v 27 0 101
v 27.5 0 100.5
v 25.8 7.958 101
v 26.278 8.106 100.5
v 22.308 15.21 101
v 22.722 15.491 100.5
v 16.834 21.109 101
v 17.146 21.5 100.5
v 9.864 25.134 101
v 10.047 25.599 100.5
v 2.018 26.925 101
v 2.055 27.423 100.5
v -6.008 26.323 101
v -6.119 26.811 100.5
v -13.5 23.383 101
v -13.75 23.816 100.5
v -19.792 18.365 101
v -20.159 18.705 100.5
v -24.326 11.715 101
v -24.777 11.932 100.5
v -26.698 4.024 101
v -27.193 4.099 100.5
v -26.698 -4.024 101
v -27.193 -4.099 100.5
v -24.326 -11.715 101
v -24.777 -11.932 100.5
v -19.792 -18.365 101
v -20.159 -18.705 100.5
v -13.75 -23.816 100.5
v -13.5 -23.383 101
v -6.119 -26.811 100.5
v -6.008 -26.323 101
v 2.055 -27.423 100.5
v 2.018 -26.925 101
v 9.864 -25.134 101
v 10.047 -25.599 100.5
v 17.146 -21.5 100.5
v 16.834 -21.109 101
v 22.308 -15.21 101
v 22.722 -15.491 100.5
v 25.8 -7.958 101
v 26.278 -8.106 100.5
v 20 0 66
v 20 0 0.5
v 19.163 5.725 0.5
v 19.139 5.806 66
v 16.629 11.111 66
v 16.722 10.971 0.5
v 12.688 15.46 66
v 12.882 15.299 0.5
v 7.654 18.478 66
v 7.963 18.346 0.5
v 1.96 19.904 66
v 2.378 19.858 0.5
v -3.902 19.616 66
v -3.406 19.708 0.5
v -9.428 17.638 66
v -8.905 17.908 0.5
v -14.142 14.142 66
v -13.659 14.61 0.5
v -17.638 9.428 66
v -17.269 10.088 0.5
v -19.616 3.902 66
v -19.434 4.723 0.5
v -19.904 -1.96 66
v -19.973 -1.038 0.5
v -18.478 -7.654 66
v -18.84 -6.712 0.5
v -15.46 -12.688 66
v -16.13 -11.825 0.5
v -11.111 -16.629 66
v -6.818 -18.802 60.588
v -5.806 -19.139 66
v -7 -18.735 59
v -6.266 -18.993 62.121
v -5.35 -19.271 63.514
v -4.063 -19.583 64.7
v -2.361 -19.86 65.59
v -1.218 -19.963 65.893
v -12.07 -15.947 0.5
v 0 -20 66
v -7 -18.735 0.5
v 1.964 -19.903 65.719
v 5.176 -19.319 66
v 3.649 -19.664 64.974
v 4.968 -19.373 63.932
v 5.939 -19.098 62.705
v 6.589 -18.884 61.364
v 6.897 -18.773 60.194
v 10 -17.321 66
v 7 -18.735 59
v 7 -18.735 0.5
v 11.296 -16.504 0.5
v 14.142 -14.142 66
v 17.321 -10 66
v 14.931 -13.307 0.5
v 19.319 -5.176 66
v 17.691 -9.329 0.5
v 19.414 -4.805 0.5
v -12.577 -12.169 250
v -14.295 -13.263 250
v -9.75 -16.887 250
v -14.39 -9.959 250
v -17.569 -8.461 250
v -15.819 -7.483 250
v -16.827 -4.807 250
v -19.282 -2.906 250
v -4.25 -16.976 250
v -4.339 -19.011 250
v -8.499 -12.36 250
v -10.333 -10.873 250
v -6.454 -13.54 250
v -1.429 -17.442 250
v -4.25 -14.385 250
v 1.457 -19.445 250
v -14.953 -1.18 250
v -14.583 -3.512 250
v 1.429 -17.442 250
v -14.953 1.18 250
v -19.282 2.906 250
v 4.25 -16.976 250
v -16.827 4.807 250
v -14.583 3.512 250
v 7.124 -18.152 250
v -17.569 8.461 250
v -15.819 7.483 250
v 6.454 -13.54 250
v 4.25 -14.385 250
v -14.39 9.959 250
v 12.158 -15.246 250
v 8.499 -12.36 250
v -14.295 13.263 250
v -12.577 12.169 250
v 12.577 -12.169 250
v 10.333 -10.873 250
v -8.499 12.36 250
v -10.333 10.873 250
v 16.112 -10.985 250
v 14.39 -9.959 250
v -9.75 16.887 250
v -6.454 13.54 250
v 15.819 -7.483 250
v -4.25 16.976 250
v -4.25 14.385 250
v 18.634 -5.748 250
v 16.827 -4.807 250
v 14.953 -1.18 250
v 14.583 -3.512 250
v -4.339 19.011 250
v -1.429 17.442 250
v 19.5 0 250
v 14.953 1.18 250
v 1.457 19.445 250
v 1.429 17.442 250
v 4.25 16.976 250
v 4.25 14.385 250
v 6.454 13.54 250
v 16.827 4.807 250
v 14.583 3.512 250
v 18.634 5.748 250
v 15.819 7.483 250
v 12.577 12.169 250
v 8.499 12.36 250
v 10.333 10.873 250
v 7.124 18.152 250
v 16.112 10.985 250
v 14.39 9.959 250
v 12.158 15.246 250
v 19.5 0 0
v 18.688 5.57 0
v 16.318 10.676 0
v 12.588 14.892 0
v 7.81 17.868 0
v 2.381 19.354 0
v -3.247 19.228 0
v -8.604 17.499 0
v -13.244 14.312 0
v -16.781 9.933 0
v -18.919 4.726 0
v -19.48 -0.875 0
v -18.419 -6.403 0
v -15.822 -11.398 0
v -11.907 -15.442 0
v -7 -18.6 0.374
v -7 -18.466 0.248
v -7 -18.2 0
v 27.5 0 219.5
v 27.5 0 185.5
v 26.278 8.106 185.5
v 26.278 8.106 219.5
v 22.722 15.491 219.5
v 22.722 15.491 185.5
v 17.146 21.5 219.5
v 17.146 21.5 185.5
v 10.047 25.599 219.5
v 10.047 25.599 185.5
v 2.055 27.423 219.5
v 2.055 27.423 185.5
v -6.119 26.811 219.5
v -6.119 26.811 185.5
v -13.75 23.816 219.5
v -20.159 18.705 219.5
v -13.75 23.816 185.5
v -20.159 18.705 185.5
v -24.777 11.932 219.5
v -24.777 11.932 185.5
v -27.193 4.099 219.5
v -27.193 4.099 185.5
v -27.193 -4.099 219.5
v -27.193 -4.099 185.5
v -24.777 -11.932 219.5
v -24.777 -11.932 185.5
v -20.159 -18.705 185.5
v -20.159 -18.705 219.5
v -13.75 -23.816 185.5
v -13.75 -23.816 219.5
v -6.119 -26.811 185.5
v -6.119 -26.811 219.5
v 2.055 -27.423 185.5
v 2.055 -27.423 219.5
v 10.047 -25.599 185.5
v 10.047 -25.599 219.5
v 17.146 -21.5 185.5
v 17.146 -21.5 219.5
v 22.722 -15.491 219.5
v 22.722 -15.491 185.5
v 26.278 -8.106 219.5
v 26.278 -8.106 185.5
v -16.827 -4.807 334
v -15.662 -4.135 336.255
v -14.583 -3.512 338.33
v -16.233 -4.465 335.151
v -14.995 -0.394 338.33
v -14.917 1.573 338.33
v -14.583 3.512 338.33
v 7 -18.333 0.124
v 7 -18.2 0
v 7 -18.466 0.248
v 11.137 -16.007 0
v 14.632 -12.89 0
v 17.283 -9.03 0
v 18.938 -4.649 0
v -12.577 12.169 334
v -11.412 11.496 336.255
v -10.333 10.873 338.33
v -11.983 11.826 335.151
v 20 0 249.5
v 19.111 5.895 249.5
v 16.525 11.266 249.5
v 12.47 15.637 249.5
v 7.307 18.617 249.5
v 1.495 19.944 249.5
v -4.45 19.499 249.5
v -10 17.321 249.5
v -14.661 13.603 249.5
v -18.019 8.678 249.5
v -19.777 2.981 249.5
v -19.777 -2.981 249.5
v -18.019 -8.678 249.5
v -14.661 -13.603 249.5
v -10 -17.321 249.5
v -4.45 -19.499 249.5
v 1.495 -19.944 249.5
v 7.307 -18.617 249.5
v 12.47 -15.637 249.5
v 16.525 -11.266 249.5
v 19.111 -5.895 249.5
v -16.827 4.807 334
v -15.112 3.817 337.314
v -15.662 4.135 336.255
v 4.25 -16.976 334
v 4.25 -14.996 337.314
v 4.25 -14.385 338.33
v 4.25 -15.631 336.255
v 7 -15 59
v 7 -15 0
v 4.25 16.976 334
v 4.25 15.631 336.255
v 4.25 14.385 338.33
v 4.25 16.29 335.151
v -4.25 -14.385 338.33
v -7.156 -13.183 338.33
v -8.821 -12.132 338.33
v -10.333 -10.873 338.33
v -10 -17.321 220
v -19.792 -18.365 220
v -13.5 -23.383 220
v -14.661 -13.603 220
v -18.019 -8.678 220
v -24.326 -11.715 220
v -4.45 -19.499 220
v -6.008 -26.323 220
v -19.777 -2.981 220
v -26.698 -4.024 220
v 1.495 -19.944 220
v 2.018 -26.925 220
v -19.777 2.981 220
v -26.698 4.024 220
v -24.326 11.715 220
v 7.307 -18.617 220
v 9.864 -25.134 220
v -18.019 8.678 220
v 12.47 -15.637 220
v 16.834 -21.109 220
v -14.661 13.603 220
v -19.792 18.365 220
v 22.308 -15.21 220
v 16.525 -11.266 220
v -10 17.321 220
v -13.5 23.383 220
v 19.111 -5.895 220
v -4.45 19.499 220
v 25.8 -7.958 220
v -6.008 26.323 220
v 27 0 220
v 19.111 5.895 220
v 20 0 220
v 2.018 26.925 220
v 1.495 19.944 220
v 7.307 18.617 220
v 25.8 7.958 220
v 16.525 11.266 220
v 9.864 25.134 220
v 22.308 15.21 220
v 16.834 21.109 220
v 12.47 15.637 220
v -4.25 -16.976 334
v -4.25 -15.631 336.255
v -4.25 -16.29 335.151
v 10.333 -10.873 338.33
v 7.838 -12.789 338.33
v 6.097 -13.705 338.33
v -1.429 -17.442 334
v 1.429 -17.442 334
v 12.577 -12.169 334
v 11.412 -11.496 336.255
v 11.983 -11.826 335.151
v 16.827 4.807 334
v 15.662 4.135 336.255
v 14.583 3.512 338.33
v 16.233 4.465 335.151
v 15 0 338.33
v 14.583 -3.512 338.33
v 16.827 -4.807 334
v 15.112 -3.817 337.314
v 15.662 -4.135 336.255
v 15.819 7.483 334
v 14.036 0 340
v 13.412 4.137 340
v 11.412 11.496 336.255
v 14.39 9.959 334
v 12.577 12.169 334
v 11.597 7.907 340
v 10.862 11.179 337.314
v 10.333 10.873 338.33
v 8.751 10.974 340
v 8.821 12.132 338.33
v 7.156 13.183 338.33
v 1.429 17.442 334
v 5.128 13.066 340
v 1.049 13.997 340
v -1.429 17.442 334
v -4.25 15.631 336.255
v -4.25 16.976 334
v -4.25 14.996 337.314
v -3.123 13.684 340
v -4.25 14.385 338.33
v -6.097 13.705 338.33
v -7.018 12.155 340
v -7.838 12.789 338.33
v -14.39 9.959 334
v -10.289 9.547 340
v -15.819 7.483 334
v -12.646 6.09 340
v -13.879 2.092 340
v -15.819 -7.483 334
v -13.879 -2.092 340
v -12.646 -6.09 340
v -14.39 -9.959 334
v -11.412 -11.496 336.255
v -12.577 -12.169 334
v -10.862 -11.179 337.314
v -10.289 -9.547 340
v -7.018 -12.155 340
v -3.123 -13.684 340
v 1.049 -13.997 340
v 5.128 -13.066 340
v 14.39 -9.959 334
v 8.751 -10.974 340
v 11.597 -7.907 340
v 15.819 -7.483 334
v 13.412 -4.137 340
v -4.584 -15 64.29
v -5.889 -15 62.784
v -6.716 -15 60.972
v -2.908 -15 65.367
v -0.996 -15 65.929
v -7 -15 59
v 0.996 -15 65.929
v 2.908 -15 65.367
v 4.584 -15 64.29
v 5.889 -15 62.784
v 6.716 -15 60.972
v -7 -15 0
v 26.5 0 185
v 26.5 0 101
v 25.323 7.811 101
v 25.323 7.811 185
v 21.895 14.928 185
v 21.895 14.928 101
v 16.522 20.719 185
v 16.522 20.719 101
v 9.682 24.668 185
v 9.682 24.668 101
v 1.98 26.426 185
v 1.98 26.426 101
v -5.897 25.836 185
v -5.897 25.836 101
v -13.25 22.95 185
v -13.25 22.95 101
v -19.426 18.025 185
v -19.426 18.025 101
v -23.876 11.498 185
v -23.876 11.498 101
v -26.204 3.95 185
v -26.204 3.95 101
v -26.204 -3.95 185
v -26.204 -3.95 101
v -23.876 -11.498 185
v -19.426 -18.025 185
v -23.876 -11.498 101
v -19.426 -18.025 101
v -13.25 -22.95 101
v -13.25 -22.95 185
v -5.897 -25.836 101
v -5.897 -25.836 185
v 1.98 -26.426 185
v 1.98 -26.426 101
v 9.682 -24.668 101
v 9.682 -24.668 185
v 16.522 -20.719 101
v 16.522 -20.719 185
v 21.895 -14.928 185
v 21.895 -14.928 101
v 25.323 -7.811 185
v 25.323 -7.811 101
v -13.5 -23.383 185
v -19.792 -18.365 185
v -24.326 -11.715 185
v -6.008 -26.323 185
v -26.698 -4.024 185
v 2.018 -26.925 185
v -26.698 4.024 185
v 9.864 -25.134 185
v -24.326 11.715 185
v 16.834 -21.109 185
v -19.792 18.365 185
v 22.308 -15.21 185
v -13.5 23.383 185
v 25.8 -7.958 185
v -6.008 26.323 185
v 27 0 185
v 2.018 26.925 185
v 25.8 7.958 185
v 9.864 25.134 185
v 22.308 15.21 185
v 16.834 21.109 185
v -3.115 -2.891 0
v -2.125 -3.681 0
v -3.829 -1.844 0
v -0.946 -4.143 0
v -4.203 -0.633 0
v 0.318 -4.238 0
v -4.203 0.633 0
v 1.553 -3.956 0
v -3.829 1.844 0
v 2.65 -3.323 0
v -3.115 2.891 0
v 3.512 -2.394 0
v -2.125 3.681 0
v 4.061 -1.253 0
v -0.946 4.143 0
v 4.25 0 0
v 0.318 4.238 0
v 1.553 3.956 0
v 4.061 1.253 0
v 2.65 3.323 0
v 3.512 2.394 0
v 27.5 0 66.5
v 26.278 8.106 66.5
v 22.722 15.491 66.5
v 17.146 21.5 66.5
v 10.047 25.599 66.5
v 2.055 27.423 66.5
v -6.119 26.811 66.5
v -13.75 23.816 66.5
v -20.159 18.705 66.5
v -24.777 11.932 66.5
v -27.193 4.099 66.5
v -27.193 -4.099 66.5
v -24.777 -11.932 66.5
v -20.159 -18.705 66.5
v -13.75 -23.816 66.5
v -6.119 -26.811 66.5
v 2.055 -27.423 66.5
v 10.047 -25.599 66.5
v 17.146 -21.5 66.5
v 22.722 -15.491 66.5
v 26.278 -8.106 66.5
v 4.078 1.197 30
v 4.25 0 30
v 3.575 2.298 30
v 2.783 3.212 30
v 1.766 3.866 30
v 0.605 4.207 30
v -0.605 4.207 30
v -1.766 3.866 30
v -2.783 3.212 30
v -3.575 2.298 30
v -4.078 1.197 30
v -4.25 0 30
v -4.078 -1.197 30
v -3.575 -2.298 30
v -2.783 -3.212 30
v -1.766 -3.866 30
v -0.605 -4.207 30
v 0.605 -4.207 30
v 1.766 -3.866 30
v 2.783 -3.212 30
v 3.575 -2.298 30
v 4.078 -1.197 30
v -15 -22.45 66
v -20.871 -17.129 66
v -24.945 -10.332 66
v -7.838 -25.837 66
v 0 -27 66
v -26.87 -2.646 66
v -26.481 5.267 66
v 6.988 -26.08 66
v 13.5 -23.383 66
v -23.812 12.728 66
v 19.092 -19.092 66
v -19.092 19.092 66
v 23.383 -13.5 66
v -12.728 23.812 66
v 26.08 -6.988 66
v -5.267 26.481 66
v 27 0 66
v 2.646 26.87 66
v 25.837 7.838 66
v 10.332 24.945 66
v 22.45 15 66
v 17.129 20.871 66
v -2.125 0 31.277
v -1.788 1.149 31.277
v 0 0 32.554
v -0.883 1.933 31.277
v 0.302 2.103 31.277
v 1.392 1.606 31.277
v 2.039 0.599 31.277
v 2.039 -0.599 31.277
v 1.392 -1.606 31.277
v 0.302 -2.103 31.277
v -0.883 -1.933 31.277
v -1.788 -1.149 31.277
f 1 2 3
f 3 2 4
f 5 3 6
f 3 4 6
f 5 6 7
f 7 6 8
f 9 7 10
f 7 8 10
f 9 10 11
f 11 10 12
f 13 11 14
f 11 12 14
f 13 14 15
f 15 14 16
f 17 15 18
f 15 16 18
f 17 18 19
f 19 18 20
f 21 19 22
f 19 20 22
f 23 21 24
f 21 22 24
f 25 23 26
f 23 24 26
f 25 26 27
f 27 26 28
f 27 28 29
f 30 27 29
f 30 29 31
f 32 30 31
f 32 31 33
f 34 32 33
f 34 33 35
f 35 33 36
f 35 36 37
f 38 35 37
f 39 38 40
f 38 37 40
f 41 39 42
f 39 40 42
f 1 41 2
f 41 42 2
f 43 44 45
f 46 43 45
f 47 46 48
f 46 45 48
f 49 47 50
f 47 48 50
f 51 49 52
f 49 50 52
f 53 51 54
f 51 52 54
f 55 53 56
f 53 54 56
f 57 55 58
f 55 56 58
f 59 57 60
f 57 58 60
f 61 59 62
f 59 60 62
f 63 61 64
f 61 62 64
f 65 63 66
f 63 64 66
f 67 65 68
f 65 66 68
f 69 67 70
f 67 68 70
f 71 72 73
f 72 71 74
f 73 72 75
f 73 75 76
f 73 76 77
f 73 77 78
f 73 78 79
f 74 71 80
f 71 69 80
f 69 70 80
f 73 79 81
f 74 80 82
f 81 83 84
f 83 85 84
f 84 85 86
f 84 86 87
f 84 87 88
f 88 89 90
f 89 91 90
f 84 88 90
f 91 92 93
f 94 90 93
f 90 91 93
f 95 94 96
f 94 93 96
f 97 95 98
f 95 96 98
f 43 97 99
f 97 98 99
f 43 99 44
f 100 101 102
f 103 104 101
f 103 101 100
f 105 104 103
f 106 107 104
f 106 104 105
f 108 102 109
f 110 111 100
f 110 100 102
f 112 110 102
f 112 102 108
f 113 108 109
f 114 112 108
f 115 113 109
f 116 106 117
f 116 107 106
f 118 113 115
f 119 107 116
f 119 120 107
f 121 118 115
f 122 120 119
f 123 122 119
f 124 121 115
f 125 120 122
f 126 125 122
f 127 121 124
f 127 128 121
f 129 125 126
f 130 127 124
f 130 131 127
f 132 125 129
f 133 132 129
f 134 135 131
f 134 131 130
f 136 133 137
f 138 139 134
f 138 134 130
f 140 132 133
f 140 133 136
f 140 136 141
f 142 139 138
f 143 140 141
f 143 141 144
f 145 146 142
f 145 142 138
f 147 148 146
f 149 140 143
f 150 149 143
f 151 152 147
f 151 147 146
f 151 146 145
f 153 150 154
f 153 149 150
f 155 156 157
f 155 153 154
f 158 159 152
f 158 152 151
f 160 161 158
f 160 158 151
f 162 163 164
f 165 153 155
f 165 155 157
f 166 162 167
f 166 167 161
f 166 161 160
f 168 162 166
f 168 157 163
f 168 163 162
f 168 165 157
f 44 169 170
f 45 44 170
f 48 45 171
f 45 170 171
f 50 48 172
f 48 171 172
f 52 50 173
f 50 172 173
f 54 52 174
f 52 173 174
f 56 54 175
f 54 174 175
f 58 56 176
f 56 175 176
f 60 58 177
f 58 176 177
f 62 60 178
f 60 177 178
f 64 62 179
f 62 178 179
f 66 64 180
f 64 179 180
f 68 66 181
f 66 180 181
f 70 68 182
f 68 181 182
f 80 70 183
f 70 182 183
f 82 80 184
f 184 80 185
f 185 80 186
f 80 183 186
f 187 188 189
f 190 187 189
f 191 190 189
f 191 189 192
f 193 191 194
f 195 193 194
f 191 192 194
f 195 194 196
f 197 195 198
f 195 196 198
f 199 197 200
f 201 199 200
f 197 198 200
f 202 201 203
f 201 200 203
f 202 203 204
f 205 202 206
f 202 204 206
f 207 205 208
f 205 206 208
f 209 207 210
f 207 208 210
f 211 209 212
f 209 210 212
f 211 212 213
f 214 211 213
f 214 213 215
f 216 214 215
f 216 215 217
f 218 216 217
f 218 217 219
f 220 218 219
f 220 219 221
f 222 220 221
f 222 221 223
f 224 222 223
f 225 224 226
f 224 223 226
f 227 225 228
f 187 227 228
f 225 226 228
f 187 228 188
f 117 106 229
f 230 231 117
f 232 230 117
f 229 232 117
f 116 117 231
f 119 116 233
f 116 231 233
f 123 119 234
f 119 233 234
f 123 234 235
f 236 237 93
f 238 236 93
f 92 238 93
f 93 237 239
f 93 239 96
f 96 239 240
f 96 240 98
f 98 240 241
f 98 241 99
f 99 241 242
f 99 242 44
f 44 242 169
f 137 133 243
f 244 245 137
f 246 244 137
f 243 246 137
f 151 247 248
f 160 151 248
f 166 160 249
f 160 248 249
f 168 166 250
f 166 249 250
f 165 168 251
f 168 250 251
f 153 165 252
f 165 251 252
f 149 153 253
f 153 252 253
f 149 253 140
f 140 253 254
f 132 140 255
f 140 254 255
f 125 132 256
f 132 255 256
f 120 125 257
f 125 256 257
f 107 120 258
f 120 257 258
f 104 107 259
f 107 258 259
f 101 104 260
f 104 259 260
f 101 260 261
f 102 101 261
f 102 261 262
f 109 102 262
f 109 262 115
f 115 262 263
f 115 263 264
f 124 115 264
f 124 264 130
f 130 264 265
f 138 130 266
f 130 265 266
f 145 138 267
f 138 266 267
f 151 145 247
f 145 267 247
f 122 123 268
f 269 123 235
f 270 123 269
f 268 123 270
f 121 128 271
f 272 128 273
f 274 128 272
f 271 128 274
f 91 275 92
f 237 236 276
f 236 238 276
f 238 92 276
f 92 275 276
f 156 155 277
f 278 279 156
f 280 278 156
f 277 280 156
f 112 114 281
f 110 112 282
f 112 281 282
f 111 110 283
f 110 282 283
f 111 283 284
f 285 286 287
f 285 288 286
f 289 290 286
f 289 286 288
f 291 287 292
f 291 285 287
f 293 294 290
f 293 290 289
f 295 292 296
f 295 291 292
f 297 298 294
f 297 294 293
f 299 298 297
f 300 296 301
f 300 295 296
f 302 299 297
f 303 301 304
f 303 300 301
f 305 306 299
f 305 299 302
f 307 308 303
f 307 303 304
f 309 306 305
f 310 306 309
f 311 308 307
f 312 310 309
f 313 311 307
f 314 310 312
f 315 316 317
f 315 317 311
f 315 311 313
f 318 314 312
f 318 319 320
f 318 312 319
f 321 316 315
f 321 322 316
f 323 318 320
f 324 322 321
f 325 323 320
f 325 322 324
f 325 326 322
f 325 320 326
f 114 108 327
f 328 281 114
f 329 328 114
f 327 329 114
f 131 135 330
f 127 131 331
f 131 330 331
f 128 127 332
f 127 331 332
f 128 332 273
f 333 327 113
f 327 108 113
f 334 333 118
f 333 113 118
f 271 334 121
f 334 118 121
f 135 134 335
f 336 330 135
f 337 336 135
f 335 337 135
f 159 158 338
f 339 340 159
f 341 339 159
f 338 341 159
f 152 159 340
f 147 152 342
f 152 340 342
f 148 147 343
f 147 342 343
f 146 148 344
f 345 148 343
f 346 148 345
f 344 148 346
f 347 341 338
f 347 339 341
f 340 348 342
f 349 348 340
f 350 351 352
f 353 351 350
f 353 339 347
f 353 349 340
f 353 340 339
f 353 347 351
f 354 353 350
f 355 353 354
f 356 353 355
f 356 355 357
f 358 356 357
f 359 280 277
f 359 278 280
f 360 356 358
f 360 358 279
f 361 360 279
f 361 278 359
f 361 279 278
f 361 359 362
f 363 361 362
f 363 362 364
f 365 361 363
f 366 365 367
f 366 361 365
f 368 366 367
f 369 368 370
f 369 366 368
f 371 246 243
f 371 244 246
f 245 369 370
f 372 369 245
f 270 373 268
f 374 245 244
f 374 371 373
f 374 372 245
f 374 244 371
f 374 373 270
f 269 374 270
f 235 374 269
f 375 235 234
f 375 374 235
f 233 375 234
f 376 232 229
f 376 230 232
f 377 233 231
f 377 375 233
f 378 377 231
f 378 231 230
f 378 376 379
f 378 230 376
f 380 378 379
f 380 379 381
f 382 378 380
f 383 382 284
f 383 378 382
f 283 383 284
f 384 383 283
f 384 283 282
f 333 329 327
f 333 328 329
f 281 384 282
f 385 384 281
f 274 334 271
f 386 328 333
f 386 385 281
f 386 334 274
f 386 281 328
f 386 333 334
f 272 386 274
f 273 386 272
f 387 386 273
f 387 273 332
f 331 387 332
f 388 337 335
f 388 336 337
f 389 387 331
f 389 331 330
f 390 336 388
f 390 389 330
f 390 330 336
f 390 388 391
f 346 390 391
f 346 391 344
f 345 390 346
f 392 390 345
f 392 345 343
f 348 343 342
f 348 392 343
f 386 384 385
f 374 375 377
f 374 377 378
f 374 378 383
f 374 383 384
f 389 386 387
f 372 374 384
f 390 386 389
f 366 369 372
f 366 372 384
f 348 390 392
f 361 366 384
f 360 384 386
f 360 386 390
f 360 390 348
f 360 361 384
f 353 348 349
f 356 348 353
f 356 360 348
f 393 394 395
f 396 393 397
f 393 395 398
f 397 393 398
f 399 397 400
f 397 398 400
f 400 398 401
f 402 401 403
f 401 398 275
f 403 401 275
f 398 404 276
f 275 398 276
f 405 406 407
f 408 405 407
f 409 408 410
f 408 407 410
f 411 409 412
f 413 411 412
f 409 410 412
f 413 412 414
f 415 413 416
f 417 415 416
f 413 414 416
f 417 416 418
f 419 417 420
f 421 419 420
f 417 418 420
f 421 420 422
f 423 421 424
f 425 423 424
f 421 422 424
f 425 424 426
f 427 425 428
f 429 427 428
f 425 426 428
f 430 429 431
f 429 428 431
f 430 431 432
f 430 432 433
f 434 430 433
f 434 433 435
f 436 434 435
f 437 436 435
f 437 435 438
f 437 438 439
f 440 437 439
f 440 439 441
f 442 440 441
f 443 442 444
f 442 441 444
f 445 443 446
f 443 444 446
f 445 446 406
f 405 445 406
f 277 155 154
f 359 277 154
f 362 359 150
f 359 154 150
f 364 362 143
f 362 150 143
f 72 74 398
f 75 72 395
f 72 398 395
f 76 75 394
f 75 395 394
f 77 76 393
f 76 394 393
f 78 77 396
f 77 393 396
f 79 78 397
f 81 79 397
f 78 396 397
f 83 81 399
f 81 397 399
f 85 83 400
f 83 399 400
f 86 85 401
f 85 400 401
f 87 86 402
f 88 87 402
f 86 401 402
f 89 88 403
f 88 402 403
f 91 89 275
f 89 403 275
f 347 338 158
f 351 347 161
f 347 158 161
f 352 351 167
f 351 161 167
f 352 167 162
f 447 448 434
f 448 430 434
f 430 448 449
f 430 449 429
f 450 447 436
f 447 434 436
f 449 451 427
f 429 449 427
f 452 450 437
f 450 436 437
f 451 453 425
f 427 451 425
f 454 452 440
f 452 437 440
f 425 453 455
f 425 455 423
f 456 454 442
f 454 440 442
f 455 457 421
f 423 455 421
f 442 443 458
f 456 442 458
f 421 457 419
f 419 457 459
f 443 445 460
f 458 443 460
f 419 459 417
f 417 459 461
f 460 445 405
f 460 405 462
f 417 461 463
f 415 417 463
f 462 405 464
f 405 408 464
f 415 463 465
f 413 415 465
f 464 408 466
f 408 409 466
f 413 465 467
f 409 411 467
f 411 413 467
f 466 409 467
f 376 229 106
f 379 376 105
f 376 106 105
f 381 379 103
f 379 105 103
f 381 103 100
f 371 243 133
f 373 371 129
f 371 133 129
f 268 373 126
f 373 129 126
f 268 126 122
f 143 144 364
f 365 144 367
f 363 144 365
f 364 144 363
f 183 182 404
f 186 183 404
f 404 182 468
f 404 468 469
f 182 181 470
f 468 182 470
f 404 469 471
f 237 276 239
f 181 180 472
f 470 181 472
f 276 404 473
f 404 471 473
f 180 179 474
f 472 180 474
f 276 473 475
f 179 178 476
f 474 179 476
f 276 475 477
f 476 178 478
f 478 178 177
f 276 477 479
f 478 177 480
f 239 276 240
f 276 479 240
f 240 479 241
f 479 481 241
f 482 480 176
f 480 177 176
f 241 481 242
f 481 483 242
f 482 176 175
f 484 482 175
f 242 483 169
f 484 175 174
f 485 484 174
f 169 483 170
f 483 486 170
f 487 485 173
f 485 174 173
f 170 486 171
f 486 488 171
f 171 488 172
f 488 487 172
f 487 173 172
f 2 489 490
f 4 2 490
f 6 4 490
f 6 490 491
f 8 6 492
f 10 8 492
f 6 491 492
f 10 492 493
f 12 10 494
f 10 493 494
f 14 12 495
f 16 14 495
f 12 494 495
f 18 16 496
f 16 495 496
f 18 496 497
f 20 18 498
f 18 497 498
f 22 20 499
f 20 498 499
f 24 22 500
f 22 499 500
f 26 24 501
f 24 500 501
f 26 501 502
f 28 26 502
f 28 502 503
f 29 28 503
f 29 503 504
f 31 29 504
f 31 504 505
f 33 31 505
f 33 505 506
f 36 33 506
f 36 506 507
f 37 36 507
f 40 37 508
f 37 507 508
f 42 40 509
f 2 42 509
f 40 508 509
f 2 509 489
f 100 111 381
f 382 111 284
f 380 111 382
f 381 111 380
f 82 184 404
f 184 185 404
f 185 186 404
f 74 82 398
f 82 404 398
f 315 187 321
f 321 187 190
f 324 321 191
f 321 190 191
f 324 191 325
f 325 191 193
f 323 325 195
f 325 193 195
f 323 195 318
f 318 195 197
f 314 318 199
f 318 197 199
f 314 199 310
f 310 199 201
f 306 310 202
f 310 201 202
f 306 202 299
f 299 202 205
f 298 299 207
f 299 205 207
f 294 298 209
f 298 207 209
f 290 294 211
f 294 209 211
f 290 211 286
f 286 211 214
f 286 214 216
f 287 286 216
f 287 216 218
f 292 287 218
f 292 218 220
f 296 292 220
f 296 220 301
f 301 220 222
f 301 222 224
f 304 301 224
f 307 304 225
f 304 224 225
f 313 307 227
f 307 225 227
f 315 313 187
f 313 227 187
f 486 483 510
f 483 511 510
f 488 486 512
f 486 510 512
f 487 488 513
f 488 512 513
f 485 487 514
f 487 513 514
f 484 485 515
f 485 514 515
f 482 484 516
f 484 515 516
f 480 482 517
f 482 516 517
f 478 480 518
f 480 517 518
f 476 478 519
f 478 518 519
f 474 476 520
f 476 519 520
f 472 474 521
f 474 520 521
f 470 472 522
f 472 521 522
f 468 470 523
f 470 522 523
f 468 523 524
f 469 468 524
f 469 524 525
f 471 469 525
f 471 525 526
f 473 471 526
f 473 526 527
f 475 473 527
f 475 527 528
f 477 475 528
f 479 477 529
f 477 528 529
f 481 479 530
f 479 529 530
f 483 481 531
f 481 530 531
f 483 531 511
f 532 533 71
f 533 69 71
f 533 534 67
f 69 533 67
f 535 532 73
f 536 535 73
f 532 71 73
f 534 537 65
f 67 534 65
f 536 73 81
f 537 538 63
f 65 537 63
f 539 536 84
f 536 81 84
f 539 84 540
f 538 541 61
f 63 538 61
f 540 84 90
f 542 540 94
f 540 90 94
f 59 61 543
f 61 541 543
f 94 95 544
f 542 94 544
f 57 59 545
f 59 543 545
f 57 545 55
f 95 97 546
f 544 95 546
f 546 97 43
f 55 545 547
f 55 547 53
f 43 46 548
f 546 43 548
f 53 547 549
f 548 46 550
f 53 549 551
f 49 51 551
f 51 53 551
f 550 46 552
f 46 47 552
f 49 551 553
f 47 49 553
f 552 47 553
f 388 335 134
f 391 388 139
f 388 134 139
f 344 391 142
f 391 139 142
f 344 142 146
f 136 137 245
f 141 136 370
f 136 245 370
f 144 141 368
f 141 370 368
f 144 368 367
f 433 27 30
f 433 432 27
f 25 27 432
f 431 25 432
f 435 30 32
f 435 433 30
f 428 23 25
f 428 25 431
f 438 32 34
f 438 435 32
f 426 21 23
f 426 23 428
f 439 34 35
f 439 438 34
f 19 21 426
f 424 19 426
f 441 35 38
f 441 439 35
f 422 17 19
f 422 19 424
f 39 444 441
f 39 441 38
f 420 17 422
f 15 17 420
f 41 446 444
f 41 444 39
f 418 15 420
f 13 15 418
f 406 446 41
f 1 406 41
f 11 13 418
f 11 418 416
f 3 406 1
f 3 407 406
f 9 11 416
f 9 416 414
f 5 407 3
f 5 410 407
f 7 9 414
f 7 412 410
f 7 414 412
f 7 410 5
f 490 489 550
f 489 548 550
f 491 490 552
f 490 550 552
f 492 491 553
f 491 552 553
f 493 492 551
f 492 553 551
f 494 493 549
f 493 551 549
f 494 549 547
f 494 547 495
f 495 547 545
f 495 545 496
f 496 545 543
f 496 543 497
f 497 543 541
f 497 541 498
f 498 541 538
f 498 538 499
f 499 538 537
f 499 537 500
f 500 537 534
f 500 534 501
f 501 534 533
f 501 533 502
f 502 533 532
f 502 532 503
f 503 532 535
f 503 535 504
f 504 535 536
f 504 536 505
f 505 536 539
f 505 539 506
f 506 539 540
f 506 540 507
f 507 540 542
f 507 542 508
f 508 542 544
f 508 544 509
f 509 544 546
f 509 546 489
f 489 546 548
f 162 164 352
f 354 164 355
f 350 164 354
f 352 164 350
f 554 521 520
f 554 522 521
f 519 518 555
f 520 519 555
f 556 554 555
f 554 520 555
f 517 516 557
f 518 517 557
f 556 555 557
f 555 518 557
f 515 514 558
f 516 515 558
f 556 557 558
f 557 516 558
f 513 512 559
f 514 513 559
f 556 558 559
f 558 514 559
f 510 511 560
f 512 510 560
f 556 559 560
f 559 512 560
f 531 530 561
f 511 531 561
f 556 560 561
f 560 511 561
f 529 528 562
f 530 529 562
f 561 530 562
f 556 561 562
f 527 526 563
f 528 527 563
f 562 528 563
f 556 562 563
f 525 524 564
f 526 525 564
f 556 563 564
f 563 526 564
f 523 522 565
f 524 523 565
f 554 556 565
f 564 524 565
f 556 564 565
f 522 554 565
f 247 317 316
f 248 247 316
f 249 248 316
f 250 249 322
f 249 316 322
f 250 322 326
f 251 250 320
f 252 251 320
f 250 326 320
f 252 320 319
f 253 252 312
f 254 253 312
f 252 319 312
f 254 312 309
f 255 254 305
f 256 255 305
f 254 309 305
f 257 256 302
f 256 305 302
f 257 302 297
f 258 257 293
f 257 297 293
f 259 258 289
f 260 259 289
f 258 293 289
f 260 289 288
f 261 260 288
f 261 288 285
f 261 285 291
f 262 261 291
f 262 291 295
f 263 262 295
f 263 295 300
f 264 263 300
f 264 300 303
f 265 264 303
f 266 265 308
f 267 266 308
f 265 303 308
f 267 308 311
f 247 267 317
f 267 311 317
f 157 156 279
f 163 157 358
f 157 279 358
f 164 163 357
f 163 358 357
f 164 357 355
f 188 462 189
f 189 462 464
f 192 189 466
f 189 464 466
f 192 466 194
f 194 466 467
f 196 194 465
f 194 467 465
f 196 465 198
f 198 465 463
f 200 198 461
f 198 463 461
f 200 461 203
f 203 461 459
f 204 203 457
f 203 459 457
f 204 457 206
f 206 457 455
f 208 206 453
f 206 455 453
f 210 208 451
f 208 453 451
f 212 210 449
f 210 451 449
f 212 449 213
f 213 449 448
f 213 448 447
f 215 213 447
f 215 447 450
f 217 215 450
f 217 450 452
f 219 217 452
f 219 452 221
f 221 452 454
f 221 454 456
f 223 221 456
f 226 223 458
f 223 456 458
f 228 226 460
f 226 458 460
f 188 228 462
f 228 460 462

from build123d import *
from build123d.topology import SkipClean

# Parameters (mm, degrees)
SKICA1_R                  = 20
P_IDAT_VYSUNUT_M1_DEPTH   = 66
SKICA2_R                  = 27.5
P_IDAT_VYSUNUT_M2_DEPTH   = 35
SKICA3_R                  = 26.5
P_IDAT_VYSUNUT_M3_DEPTH   = 84
SKICA4_R                  = 27.5
P_IDAT_VYSUNUT_M4_DEPTH   = 35
SKICA5_R                  = 20
P_IDAT_VYSUNUT_M5_DEPTH   = 30
SKICA6_R                  = 17.5
P_IDAT_VYSUNUT_M6_DEPTH   = 90
ZKOSEN_3_SIZE             = 6
ZKOSEN_3_SIZE2            = 3.464101615
SKICA9_OUTSIDE_W          = 126.756
SKICA9_OUTSIDE_H          = 126.756
ODEBRAT_VYSUNUT_M16_DEPTH = 90
ZKOSEN_4_SIZE             = 0.5
M10_Z_VIT1_D              = 8.5
M10_Z_VIT1_DEPTH          = 30
M10_Z_VIT1_TIP            = 2.553657631
ODEBRAT_START             = -15
ODEBRAT_VYSUNUT_M17_DEPTH = 13.5


with BuildPart() as part:
    # Skica1 → P_idat vysunut_m1 (new body)
    with BuildSketch(Plane.XY):
        Circle(SKICA1_R)
    extrude(amount=P_IDAT_VYSUNUT_M1_DEPTH)

    # Skica2 → P_idat vysunut_m2 (add)
    with BuildSketch(Plane.XY.offset(66)):
        Circle(SKICA2_R)
    extrude(amount=P_IDAT_VYSUNUT_M2_DEPTH)

    # Skica3 → P_idat vysunut_m3 (add)
    with BuildSketch(Plane.XY.offset(101)):
        Circle(SKICA3_R)
    extrude(amount=P_IDAT_VYSUNUT_M3_DEPTH)

    # Skica4 → P_idat vysunut_m4 (add)
    with BuildSketch(Plane.XY.offset(185)):
        Circle(SKICA4_R)
    extrude(amount=P_IDAT_VYSUNUT_M4_DEPTH)

    # Skica5 → P_idat vysunut_m5 (add)
    with BuildSketch(Plane.XY.offset(220)):
        Circle(SKICA5_R)
    extrude(amount=P_IDAT_VYSUNUT_M5_DEPTH)

    # Skica6 → P_idat vysunut_m6 (add)
    with BuildSketch(Plane.XY.offset(250)):
        Circle(SKICA6_R)
    extrude(amount=P_IDAT_VYSUNUT_M6_DEPTH)

    # Zkosen_3
    zkosen_3_edges = [part.edges().sort_by_distance(p)[0] for p in [
        (-17.5, 0, 340),
    ]]
    zkosen_3_side = [part.faces().sort_by_distance(p)[0] for p in [
        (-17.5, 0, 295),
    ]]
    chamfer(zkosen_3_edges, length=ZKOSEN_3_SIZE, length2=ZKOSEN_3_SIZE2, reference=zkosen_3_side[0])

    # Skica9 outside → Odebrat vysunut_m16 (cut)
    with BuildSketch(Plane.XY.offset(340)):
        Rectangle(SKICA9_OUTSIDE_W, SKICA9_OUTSIDE_H)
        with BuildLine():
            Line((-4.25, 14.385322381), (-4.25, 16.976086121))
            ThreePointArc((-4.25, 16.976086121), (0, 17.5), (4.25, 16.976086121))
            Line((4.25, 16.976086121), (4.25, 14.385322381))
            ThreePointArc((4.25, 14.385322381), (7.5, 12.990381057), (10.333054623, 10.873269156))
            Line((10.333054623, 10.873269156), (12.576721838, 12.168651027))
            ThreePointArc((12.576721838, 12.168651027), (15.155444566, 8.75), (16.826721838, 4.807435095))
            Line((16.826721838, 4.807435095), (14.583054623, 3.512053224))
            ThreePointArc((14.583054623, 3.512053224), (15, 0), (14.583054623, -3.512053224))
            Line((14.583054623, -3.512053224), (16.826721838, -4.807435095))
            ThreePointArc((16.826721838, -4.807435095), (15.155444566, -8.75), (12.576721838, -12.168651027))
            Line((12.576721838, -12.168651027), (10.333054623, -10.873269156))
            ThreePointArc((10.333054623, -10.873269156), (7.5, -12.990381057), (4.25, -14.385322381))
            Line((4.25, -14.385322381), (4.25, -16.976086121))
            ThreePointArc((4.25, -16.976086121), (0, -17.5), (-4.25, -16.976086121))
            Line((-4.25, -16.976086121), (-4.25, -14.385322381))
            ThreePointArc((-4.25, -14.385322381), (-7.5, -12.990381057), (-10.333054623, -10.873269156))
            Line((-10.333054623, -10.873269156), (-12.576721838, -12.168651027))
            ThreePointArc((-12.576721838, -12.168651027), (-15.155444566, -8.75), (-16.826721838, -4.807435095))
            Line((-16.826721838, -4.807435095), (-14.583054623, -3.512053224))
            ThreePointArc((-14.583054623, -3.512053224), (-15, 0), (-14.583054623, 3.512053224))
            Line((-14.583054623, 3.512053224), (-16.826721838, 4.807435095))
            ThreePointArc((-16.826721838, 4.807435095), (-15.155444566, 8.75), (-12.576721838, 12.168651027))
            Line((-12.576721838, 12.168651027), (-10.333054623, 10.873269156))
            ThreePointArc((-10.333054623, 10.873269156), (-7.5, 12.990381057), (-4.25, 14.385322381))
        make_face(mode=Mode.SUBTRACT)
    extrude(amount=-ODEBRAT_VYSUNUT_M16_DEPTH, mode=Mode.SUBTRACT)

    # Zkosen_4
    zkosen_4_edges = [part.edges().sort_by_distance(p)[0] for p in [
        (-27.5, 0, 185),
        (-27.5, 0, 220),
        (-20, 0, 0),
        (-20, 0, 250),
        (-27.5, 0, 66),
        (-27.5, 0, 101),
    ]]
    chamfer(zkosen_4_edges, length=ZKOSEN_4_SIZE)

    # M10 z_vit1
    with Locations(Plane(origin=(0, 0, 0), x_dir=(-1, 0, 0), z_dir=(0, 0, -1))):
        with Locations((0, 0)):
            Hole(M10_Z_VIT1_D / 2, depth=M10_Z_VIT1_DEPTH)
            with Locations((0, 0, -(M10_Z_VIT1_DEPTH + M10_Z_VIT1_TIP / 2))):  # 118° drill point
                Cone(0, M10_Z_VIT1_D / 2, M10_Z_VIT1_TIP, mode=Mode.SUBTRACT)

    # Skica12 → Odebrat vysunut_m17 (cut, through all)
    with SkipClean():  # keep this step's faces unmerged: merging them makes the solid invalid here
        with BuildSketch(Plane(origin=(0, 0, 0), x_dir=(1, 0, 0), z_dir=(0, 1, 0)).offset(ODEBRAT_START)):
            with BuildLine():
                Line((-7, 0), (-7, -58.99999898))
                ThreePointArc((-7, -58.99999898), (0, -66), (7, -58.99999898))
                Line((7, -58.99999898), (7, 0))
                Line((7, 0), (-7, 0))
            make_face()
        extrude(amount=-ODEBRAT_VYSUNUT_M17_DEPTH, mode=Mode.SUBTRACT)


solid = part.part
